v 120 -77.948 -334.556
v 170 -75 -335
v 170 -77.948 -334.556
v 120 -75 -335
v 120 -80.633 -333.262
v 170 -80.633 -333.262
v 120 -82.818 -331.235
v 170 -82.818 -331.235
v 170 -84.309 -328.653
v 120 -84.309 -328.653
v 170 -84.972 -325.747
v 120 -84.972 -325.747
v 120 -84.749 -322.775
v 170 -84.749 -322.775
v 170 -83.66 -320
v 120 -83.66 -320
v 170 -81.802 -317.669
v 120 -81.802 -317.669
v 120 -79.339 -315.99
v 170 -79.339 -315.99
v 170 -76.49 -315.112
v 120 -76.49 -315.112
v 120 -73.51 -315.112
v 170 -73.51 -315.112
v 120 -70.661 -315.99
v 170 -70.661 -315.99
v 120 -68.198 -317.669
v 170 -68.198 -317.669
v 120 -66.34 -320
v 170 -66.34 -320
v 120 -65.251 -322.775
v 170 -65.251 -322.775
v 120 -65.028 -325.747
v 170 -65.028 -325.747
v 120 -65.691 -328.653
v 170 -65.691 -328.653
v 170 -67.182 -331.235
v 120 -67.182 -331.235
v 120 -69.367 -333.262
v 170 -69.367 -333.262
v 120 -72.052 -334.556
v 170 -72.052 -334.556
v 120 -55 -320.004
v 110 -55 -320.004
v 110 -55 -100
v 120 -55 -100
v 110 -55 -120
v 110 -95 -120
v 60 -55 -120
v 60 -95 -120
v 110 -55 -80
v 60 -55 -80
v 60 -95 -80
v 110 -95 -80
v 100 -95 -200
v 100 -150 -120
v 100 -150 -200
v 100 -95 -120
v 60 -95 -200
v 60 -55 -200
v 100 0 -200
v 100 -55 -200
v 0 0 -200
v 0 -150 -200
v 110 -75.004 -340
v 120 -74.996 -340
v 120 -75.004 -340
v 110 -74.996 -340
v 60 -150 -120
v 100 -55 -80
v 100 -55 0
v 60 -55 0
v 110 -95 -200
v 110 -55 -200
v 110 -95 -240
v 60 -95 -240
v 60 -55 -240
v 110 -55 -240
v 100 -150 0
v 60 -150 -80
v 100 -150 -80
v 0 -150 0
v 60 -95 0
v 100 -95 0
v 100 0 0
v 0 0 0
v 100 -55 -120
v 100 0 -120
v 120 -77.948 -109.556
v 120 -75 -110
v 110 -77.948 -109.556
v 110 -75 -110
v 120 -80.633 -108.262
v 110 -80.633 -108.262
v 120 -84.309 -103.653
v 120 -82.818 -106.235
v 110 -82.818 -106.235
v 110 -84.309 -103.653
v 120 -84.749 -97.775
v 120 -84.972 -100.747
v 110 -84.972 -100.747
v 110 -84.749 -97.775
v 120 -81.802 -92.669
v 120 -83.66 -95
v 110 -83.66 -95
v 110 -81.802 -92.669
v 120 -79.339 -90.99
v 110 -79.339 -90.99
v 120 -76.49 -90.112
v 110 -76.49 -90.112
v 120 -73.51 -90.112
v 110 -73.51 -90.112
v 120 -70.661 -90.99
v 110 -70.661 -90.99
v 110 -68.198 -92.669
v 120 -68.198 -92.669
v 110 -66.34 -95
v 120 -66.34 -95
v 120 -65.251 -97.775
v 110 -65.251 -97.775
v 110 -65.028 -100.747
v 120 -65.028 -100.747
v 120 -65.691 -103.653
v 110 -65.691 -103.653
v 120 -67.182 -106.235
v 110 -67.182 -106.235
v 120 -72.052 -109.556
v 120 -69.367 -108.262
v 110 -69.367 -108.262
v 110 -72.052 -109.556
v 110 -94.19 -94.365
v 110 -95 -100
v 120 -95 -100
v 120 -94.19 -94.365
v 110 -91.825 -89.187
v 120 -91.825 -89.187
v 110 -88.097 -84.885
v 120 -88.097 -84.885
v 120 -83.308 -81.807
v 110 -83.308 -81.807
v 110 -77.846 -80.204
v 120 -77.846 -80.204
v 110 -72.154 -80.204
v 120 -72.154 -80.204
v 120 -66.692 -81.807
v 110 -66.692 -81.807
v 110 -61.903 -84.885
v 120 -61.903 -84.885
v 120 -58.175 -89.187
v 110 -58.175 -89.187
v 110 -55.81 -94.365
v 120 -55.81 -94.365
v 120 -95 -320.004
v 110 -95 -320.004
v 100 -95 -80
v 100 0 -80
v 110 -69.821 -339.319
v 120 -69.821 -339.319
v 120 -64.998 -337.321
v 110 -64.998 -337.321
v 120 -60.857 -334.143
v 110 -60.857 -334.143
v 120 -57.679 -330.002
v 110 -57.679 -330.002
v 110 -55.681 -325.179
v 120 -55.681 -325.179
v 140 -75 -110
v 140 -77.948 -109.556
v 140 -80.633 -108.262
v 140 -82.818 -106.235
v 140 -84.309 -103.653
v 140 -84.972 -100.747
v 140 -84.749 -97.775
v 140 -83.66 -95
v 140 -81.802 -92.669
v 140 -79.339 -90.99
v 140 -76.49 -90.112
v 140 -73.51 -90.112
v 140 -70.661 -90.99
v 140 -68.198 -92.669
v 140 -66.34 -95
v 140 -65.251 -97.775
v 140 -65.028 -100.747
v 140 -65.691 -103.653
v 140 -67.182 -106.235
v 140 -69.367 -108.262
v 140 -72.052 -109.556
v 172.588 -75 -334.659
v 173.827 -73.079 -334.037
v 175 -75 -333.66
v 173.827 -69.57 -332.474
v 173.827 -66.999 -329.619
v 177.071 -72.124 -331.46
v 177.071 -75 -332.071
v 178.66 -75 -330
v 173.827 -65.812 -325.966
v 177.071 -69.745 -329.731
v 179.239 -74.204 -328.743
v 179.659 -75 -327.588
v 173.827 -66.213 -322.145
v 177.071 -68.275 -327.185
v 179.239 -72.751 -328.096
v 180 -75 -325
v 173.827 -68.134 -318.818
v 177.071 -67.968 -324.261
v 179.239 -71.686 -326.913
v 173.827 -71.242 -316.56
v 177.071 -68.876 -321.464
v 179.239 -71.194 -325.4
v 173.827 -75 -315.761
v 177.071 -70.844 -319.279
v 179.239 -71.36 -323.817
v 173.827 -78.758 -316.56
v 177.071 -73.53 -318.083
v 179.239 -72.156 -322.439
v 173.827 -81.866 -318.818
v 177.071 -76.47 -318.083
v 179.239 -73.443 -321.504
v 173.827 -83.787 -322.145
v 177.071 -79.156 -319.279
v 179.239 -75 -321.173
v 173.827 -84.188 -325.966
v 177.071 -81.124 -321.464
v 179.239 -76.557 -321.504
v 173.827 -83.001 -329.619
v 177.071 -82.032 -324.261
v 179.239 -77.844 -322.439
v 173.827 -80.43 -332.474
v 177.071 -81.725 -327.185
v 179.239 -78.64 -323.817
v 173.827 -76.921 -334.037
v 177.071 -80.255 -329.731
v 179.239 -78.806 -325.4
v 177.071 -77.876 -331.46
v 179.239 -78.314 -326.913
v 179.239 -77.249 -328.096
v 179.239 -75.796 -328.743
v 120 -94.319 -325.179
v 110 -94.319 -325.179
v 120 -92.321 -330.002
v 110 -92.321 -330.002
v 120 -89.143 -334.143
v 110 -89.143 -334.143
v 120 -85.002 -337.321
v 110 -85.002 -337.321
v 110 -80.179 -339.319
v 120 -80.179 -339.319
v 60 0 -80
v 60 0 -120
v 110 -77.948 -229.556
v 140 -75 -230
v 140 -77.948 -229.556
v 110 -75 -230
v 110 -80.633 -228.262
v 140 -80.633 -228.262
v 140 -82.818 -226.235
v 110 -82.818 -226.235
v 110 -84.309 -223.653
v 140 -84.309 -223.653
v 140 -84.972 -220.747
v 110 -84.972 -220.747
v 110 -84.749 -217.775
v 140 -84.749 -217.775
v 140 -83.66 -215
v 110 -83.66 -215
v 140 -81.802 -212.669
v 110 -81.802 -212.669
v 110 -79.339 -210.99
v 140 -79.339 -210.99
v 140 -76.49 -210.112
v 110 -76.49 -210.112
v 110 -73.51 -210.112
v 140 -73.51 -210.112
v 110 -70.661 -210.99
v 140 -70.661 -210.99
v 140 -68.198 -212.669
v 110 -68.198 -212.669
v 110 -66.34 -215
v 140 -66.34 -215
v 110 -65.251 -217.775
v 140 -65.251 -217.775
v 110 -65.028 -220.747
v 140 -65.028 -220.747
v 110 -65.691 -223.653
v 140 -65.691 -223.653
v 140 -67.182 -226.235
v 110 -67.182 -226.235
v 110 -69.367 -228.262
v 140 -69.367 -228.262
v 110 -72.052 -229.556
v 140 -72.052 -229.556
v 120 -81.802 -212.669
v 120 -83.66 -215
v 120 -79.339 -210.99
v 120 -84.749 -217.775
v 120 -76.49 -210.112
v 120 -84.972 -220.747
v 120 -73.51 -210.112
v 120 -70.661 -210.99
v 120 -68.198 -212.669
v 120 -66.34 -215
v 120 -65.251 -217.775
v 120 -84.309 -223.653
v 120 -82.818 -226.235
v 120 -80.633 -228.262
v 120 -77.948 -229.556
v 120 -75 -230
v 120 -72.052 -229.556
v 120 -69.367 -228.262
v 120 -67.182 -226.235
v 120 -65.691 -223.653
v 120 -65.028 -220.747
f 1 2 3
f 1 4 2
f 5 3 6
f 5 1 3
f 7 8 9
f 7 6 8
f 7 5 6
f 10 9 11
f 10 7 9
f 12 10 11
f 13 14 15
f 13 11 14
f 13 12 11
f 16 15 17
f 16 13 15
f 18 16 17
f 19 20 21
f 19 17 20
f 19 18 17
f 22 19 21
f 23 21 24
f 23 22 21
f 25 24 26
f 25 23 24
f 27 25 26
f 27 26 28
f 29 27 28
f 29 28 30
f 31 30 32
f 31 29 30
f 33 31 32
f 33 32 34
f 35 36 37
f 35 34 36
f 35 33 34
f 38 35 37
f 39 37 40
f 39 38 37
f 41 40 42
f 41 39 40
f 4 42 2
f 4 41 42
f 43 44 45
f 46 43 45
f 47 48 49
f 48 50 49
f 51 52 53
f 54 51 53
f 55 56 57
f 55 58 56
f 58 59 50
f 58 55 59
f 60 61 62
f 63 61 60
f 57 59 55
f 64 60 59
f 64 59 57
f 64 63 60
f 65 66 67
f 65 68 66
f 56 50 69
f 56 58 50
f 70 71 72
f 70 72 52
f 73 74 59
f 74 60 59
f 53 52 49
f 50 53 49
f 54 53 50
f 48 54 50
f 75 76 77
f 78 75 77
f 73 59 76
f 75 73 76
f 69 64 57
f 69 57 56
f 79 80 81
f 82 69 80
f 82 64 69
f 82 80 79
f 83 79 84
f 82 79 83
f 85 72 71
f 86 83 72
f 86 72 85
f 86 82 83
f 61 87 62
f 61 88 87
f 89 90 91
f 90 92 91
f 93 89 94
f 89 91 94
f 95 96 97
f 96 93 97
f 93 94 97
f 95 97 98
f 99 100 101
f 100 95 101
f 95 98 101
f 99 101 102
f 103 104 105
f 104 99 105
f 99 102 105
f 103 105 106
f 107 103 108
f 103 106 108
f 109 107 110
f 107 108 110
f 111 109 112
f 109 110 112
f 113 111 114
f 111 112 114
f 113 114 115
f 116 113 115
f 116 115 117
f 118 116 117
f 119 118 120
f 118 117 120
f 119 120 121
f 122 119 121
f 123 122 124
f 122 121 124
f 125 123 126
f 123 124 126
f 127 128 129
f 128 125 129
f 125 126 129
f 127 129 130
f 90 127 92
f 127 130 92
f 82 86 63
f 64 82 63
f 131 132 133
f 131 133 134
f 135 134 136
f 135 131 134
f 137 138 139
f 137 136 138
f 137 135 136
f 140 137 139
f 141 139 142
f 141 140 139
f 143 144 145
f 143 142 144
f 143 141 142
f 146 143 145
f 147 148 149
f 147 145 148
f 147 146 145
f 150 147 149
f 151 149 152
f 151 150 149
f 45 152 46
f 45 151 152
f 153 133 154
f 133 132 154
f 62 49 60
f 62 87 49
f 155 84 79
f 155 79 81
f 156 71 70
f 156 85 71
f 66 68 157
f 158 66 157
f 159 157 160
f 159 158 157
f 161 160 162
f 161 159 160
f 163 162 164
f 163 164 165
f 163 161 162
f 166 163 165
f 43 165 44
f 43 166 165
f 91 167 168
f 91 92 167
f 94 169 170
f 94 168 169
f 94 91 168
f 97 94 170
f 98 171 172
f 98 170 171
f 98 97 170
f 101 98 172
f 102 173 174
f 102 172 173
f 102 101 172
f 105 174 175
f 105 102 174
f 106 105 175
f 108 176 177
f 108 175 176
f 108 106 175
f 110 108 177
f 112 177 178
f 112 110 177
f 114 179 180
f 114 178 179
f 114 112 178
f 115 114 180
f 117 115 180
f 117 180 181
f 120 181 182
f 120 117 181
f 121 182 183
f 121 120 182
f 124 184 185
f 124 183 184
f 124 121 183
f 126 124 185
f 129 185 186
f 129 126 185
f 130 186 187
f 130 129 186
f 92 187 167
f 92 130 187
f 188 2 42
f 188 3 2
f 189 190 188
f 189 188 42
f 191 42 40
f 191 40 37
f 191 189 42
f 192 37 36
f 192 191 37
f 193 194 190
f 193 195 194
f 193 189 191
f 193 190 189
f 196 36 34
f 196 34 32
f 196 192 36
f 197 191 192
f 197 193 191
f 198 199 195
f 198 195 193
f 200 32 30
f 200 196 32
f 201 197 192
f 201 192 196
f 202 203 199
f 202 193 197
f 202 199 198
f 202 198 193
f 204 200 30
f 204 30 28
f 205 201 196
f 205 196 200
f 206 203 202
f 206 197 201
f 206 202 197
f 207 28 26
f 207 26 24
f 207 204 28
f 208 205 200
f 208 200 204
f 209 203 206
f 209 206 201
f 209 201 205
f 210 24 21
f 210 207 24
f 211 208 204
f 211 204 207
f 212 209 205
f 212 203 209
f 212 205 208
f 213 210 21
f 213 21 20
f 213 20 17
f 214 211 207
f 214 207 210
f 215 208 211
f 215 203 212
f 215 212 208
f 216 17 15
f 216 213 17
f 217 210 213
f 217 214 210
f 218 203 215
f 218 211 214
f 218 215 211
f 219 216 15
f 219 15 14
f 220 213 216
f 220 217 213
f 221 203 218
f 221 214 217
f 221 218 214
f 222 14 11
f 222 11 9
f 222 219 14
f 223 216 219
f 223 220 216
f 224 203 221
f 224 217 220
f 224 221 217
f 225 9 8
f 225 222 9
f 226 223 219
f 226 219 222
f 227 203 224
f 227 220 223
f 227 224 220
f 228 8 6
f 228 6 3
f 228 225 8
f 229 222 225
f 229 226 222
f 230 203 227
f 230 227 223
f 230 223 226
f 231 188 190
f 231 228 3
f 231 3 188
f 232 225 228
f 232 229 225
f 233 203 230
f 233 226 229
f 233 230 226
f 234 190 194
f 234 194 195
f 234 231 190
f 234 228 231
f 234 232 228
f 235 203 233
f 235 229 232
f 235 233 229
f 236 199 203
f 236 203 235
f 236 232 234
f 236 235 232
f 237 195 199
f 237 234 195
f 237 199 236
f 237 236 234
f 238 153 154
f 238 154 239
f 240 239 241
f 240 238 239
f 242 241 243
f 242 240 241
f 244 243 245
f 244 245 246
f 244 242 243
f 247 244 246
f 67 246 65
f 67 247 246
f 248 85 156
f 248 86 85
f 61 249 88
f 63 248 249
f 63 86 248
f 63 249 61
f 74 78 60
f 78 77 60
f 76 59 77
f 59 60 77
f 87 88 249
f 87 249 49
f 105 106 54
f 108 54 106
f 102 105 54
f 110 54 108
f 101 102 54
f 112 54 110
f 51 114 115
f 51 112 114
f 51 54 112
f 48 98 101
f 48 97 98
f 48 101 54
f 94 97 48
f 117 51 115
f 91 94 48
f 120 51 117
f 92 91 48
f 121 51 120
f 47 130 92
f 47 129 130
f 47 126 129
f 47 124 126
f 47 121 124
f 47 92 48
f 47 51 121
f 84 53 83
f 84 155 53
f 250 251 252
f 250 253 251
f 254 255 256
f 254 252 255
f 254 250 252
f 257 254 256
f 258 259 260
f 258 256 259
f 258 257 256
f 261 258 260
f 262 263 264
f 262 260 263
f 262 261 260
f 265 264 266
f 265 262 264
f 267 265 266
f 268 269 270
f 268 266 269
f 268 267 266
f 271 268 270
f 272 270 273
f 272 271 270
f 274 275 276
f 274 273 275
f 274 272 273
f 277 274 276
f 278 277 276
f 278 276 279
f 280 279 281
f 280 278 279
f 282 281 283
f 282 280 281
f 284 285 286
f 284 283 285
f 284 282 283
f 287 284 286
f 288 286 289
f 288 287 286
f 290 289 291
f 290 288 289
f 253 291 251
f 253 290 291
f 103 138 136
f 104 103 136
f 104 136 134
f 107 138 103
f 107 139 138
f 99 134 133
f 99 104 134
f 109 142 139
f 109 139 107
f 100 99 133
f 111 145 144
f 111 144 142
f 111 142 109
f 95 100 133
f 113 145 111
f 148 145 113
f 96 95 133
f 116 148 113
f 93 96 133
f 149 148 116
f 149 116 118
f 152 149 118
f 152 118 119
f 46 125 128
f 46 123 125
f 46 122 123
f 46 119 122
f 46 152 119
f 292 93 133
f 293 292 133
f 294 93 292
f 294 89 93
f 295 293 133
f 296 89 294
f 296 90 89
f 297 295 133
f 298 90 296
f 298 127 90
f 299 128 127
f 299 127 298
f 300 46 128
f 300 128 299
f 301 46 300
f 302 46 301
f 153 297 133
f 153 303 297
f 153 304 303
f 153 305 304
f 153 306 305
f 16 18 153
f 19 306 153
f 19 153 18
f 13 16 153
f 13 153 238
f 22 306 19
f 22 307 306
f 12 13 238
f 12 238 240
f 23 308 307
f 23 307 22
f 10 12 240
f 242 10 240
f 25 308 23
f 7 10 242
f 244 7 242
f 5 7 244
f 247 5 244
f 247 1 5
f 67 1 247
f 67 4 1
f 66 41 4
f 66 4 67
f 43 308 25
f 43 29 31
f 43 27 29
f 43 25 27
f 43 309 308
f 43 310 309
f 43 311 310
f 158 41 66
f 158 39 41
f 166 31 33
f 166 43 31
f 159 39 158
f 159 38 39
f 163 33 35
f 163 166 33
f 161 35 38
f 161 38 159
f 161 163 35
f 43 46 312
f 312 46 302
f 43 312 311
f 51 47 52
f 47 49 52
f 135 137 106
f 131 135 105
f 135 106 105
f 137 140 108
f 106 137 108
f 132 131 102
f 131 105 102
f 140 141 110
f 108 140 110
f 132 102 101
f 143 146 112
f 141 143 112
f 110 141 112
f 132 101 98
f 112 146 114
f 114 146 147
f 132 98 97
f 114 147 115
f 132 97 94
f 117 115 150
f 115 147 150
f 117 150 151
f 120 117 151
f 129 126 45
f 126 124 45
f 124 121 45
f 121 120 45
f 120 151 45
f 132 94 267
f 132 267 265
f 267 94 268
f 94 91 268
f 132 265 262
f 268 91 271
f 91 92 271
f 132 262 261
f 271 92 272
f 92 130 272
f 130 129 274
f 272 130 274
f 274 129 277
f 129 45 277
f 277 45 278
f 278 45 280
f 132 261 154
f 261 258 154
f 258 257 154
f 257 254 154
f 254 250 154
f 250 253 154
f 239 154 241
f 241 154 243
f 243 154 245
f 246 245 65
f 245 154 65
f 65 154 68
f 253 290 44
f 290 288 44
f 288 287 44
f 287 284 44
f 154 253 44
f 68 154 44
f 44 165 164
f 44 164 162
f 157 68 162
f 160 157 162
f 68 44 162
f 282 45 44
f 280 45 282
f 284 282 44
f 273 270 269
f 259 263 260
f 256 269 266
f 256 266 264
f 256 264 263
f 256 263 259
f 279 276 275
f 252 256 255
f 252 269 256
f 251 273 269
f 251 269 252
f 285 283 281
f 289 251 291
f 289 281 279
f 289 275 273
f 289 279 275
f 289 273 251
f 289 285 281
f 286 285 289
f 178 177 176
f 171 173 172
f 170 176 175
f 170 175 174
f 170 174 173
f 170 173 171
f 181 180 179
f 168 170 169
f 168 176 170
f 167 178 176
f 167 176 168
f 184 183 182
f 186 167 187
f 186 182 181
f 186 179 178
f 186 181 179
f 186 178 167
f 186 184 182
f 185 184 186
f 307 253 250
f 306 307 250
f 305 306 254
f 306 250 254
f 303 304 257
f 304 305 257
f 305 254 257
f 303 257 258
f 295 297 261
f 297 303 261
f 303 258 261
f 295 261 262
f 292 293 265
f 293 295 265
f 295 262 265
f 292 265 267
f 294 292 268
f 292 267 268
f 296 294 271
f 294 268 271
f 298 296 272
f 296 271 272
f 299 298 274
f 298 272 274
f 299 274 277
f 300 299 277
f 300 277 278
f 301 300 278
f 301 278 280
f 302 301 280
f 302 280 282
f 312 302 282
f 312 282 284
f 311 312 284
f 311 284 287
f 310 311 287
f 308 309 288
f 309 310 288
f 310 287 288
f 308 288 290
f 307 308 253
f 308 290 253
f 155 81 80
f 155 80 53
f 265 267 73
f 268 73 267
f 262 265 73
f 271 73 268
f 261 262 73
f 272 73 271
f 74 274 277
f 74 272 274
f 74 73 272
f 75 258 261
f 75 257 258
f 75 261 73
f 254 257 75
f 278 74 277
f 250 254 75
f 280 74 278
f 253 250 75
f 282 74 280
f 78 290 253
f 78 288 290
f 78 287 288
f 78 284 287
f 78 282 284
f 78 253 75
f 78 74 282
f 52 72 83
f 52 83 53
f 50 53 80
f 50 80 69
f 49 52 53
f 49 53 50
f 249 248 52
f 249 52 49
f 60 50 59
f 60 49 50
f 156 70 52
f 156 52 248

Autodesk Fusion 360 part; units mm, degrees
sketch "Sketch1" plane through (0, 0, 0) normal (1, 0, 0) x (0, 0, -1)
  line L0 (0, 0) -> (200, 0)
  line L1 (200, 0) -> (200, -150)
  line L2 (200, -150) -> (0, -150)
  line L3 (0, -150) -> (0, 0)
  dimension "d1" = 200
  dimension "d2" = 150
extrude "Extrude1" add sketch "Sketch1" along normal blind 100 makes body 1
sketch "Sketch2" plane through (100, 0, 0) normal (1, 0, 0) x (0, 0, -1)
  line L0 (0, -150) -> (200, -150)
  line L1 (200, -150) -> (200, 0)
  line L2 (200, 0) -> (0, 0)
  line L3 (0, 0) -> (0, -150)
  line L4 (100, -20) -> (100, -140)
  line L5 (20, -75) -> (170, -75)
  line L6 (80, 30) -> (120, 30)
  line L7 (120, 30) -> (120, -175.2632)
  line L8 (120, -175.2632) -> (80, -175.2632)
  line L9 (80, -175.2632) -> (80, 30)
  line L10 (-30, -55) -> (232.2693, -55)
  line L11 (232.2693, -55) -> (232.2693, -95)
  line L12 (232.2693, -95) -> (-30, -95)
  line L13 (-30, -95) -> (-30, -55)
  dimension "d5" = 40
  dimension "d6" = 40
extrude "Extrude2" cut sketch "Sketch2" against normal blind 40 contours L0 L7 L9 L12 | L3 L9 L10 L12 | L4 L5 L9 L12 | L4 L5 L7 L12 | L1 L7 L10 L12 | L4 L5 L9 L10 | L2 L7 L9 L10 | L4 L5 L7 L10 bodies 1
sketch "Sketch3" plane through (60, 0, 0) normal (1, 0, 0) x (0, 0, -1)
  line L0 (120, -95) -> (200, -95)
  line L1 (200, -95) -> (200, -55)
  line L2 (200, -55) -> (120, -55)
  line L3 (120, -55) -> (120, 0)
  line L4 (120, 0) -> (80, 0)
  line L5 (80, 0) -> (80, -55)
  line L6 (80, -55) -> (0, -55)
  line L7 (0, -55) -> (0, -95)
  line L8 (0, -95) -> (80, -95)
  line L9 (80, -95) -> (80, -150)
  line L10 (80, -150) -> (120, -150)
  line L11 (120, -150) -> (120, -95)
  line L12 (80, 0) -> (120, 0)
  line L13 (120, 0) -> (120, -40)
  line L14 (120, -40) -> (80, -40)
  line L15 (80, -40) -> (80, 0)
  line L16 (200, -55) -> (160, -55)
  line L17 (160, -55) -> (160, -95)
  line L18 (160, -95) -> (200, -95)
  line L19 (200, -95) -> (200, -55)
  line L20 (80, -150) -> (120, -150)
  line L21 (120, -150) -> (120, -110)
  line L22 (120, -110) -> (80, -110)
  line L23 (80, -110) -> (80, -150)
  line L24 (0, -55) -> (40, -55)
  line L25 (40, -55) -> (40, -95)
  line L26 (40, -95) -> (0, -95)
  line L27 (0, -95) -> (0, -55)
  dimension "d9" = 40
  dimension "d10" = 40
extrude "Extrude1'" add sketch "Sketch3" along normal blind 50 separate body contours L0 L1 L2 L16 L17 L18 L19 makes body 2 in component "Component"
sketch "Sketch4" plane through (110, 0, 0) normal (1, 0, 0) x (0, 0, -1)
  line L0 (200, -95) -> (200, -55)
  line L1 (200, -55) -> (160, -55)
  line L2 (160, -55) -> (160, -95)
  line L3 (160, -95) -> (200, -95)
  circle A0 centre (180, -75) radius 10
  dimension "d13" = 20
extrude "Extrude2'" add sketch "Sketch4" along normal blind 30 contours A0 bodies 2 in component "Component"
sketch "Sketch5" plane through (100, 0, 0) normal (1, 0, 0) x (0, 0, -1)
  line L0 (120, 0) -> (120, -55)
  line L1 (120, -55) -> (200, -55)
  line L2 (200, -55) -> (200, 0)
  line L3 (200, 0) -> (120, 0)
  line L4 (70, 50) -> (190, 50)
  line L5 (190, 90) -> (70, 90)
  arc A0 (70, 90) -> (70, 50) centre (70, 70) ccw
  line L6 (70, 70) -> (190, 70) construction
  line L7 (190, 90) -> (310, 90)
  line L8 (310, 90) -> (310, 50)
  line L9 (310, 50) -> (190, 50)
  circle A1 centre (70, 70) radius 10
  circle A2 centre (190, 70) radius 10
  dimension "d16" = 120
  dimension "d18" = 20
  dimension "d19" = 20
extrude "Extrude1''" add sketch "Sketch5" along normal blind 10 separate body contours L4 L5 A0 L7 L8 L9 makes body 3 in component "Component'"
sketch "Sketch6" plane through (110, 0, 0) normal (1, 0, 0) x (0, 0, -1)
  circle A0 centre (70, 70) radius 10
  circle A1 centre (190, 70) radius 10
  line L0 (310, 90) -> (70, 90)
  arc A2 (70, 90) -> (70, 50) centre (70, 70) ccw
  line L1 (70, 50) -> (310, 50)
  line L2 (310, 50) -> (310, 90)
  circle A3 centre (295, 70) radius 10
  dimension "d22" = 20
extrude "Extrude2''" add sketch "Sketch6" along normal blind 60 contours A3 bodies 3 in component "Component'"
fillet "Fillet1" radius 10 1 edges at (170, 66.3838, -285.6767) on bodies 3 in component "Component'"
fillet "Fillet2" radius 20 2 edges at (105, 50, -310) (105, 90, -310) on bodies 3 in component "Component'"
component "Component" placed x (1, 0, 0) y (0, 1, 0) z (0, 0, 1) at (0, 0, -40)
component "Component" placed x (1, 0, 0) y (0, 1, 0) z (0, 0, 1) at (0, 0, 80)
component "Component'" placed x (1, 0, 0) y (0, 1, 0) z (0, 0, 1) at (10, -145, -30)
